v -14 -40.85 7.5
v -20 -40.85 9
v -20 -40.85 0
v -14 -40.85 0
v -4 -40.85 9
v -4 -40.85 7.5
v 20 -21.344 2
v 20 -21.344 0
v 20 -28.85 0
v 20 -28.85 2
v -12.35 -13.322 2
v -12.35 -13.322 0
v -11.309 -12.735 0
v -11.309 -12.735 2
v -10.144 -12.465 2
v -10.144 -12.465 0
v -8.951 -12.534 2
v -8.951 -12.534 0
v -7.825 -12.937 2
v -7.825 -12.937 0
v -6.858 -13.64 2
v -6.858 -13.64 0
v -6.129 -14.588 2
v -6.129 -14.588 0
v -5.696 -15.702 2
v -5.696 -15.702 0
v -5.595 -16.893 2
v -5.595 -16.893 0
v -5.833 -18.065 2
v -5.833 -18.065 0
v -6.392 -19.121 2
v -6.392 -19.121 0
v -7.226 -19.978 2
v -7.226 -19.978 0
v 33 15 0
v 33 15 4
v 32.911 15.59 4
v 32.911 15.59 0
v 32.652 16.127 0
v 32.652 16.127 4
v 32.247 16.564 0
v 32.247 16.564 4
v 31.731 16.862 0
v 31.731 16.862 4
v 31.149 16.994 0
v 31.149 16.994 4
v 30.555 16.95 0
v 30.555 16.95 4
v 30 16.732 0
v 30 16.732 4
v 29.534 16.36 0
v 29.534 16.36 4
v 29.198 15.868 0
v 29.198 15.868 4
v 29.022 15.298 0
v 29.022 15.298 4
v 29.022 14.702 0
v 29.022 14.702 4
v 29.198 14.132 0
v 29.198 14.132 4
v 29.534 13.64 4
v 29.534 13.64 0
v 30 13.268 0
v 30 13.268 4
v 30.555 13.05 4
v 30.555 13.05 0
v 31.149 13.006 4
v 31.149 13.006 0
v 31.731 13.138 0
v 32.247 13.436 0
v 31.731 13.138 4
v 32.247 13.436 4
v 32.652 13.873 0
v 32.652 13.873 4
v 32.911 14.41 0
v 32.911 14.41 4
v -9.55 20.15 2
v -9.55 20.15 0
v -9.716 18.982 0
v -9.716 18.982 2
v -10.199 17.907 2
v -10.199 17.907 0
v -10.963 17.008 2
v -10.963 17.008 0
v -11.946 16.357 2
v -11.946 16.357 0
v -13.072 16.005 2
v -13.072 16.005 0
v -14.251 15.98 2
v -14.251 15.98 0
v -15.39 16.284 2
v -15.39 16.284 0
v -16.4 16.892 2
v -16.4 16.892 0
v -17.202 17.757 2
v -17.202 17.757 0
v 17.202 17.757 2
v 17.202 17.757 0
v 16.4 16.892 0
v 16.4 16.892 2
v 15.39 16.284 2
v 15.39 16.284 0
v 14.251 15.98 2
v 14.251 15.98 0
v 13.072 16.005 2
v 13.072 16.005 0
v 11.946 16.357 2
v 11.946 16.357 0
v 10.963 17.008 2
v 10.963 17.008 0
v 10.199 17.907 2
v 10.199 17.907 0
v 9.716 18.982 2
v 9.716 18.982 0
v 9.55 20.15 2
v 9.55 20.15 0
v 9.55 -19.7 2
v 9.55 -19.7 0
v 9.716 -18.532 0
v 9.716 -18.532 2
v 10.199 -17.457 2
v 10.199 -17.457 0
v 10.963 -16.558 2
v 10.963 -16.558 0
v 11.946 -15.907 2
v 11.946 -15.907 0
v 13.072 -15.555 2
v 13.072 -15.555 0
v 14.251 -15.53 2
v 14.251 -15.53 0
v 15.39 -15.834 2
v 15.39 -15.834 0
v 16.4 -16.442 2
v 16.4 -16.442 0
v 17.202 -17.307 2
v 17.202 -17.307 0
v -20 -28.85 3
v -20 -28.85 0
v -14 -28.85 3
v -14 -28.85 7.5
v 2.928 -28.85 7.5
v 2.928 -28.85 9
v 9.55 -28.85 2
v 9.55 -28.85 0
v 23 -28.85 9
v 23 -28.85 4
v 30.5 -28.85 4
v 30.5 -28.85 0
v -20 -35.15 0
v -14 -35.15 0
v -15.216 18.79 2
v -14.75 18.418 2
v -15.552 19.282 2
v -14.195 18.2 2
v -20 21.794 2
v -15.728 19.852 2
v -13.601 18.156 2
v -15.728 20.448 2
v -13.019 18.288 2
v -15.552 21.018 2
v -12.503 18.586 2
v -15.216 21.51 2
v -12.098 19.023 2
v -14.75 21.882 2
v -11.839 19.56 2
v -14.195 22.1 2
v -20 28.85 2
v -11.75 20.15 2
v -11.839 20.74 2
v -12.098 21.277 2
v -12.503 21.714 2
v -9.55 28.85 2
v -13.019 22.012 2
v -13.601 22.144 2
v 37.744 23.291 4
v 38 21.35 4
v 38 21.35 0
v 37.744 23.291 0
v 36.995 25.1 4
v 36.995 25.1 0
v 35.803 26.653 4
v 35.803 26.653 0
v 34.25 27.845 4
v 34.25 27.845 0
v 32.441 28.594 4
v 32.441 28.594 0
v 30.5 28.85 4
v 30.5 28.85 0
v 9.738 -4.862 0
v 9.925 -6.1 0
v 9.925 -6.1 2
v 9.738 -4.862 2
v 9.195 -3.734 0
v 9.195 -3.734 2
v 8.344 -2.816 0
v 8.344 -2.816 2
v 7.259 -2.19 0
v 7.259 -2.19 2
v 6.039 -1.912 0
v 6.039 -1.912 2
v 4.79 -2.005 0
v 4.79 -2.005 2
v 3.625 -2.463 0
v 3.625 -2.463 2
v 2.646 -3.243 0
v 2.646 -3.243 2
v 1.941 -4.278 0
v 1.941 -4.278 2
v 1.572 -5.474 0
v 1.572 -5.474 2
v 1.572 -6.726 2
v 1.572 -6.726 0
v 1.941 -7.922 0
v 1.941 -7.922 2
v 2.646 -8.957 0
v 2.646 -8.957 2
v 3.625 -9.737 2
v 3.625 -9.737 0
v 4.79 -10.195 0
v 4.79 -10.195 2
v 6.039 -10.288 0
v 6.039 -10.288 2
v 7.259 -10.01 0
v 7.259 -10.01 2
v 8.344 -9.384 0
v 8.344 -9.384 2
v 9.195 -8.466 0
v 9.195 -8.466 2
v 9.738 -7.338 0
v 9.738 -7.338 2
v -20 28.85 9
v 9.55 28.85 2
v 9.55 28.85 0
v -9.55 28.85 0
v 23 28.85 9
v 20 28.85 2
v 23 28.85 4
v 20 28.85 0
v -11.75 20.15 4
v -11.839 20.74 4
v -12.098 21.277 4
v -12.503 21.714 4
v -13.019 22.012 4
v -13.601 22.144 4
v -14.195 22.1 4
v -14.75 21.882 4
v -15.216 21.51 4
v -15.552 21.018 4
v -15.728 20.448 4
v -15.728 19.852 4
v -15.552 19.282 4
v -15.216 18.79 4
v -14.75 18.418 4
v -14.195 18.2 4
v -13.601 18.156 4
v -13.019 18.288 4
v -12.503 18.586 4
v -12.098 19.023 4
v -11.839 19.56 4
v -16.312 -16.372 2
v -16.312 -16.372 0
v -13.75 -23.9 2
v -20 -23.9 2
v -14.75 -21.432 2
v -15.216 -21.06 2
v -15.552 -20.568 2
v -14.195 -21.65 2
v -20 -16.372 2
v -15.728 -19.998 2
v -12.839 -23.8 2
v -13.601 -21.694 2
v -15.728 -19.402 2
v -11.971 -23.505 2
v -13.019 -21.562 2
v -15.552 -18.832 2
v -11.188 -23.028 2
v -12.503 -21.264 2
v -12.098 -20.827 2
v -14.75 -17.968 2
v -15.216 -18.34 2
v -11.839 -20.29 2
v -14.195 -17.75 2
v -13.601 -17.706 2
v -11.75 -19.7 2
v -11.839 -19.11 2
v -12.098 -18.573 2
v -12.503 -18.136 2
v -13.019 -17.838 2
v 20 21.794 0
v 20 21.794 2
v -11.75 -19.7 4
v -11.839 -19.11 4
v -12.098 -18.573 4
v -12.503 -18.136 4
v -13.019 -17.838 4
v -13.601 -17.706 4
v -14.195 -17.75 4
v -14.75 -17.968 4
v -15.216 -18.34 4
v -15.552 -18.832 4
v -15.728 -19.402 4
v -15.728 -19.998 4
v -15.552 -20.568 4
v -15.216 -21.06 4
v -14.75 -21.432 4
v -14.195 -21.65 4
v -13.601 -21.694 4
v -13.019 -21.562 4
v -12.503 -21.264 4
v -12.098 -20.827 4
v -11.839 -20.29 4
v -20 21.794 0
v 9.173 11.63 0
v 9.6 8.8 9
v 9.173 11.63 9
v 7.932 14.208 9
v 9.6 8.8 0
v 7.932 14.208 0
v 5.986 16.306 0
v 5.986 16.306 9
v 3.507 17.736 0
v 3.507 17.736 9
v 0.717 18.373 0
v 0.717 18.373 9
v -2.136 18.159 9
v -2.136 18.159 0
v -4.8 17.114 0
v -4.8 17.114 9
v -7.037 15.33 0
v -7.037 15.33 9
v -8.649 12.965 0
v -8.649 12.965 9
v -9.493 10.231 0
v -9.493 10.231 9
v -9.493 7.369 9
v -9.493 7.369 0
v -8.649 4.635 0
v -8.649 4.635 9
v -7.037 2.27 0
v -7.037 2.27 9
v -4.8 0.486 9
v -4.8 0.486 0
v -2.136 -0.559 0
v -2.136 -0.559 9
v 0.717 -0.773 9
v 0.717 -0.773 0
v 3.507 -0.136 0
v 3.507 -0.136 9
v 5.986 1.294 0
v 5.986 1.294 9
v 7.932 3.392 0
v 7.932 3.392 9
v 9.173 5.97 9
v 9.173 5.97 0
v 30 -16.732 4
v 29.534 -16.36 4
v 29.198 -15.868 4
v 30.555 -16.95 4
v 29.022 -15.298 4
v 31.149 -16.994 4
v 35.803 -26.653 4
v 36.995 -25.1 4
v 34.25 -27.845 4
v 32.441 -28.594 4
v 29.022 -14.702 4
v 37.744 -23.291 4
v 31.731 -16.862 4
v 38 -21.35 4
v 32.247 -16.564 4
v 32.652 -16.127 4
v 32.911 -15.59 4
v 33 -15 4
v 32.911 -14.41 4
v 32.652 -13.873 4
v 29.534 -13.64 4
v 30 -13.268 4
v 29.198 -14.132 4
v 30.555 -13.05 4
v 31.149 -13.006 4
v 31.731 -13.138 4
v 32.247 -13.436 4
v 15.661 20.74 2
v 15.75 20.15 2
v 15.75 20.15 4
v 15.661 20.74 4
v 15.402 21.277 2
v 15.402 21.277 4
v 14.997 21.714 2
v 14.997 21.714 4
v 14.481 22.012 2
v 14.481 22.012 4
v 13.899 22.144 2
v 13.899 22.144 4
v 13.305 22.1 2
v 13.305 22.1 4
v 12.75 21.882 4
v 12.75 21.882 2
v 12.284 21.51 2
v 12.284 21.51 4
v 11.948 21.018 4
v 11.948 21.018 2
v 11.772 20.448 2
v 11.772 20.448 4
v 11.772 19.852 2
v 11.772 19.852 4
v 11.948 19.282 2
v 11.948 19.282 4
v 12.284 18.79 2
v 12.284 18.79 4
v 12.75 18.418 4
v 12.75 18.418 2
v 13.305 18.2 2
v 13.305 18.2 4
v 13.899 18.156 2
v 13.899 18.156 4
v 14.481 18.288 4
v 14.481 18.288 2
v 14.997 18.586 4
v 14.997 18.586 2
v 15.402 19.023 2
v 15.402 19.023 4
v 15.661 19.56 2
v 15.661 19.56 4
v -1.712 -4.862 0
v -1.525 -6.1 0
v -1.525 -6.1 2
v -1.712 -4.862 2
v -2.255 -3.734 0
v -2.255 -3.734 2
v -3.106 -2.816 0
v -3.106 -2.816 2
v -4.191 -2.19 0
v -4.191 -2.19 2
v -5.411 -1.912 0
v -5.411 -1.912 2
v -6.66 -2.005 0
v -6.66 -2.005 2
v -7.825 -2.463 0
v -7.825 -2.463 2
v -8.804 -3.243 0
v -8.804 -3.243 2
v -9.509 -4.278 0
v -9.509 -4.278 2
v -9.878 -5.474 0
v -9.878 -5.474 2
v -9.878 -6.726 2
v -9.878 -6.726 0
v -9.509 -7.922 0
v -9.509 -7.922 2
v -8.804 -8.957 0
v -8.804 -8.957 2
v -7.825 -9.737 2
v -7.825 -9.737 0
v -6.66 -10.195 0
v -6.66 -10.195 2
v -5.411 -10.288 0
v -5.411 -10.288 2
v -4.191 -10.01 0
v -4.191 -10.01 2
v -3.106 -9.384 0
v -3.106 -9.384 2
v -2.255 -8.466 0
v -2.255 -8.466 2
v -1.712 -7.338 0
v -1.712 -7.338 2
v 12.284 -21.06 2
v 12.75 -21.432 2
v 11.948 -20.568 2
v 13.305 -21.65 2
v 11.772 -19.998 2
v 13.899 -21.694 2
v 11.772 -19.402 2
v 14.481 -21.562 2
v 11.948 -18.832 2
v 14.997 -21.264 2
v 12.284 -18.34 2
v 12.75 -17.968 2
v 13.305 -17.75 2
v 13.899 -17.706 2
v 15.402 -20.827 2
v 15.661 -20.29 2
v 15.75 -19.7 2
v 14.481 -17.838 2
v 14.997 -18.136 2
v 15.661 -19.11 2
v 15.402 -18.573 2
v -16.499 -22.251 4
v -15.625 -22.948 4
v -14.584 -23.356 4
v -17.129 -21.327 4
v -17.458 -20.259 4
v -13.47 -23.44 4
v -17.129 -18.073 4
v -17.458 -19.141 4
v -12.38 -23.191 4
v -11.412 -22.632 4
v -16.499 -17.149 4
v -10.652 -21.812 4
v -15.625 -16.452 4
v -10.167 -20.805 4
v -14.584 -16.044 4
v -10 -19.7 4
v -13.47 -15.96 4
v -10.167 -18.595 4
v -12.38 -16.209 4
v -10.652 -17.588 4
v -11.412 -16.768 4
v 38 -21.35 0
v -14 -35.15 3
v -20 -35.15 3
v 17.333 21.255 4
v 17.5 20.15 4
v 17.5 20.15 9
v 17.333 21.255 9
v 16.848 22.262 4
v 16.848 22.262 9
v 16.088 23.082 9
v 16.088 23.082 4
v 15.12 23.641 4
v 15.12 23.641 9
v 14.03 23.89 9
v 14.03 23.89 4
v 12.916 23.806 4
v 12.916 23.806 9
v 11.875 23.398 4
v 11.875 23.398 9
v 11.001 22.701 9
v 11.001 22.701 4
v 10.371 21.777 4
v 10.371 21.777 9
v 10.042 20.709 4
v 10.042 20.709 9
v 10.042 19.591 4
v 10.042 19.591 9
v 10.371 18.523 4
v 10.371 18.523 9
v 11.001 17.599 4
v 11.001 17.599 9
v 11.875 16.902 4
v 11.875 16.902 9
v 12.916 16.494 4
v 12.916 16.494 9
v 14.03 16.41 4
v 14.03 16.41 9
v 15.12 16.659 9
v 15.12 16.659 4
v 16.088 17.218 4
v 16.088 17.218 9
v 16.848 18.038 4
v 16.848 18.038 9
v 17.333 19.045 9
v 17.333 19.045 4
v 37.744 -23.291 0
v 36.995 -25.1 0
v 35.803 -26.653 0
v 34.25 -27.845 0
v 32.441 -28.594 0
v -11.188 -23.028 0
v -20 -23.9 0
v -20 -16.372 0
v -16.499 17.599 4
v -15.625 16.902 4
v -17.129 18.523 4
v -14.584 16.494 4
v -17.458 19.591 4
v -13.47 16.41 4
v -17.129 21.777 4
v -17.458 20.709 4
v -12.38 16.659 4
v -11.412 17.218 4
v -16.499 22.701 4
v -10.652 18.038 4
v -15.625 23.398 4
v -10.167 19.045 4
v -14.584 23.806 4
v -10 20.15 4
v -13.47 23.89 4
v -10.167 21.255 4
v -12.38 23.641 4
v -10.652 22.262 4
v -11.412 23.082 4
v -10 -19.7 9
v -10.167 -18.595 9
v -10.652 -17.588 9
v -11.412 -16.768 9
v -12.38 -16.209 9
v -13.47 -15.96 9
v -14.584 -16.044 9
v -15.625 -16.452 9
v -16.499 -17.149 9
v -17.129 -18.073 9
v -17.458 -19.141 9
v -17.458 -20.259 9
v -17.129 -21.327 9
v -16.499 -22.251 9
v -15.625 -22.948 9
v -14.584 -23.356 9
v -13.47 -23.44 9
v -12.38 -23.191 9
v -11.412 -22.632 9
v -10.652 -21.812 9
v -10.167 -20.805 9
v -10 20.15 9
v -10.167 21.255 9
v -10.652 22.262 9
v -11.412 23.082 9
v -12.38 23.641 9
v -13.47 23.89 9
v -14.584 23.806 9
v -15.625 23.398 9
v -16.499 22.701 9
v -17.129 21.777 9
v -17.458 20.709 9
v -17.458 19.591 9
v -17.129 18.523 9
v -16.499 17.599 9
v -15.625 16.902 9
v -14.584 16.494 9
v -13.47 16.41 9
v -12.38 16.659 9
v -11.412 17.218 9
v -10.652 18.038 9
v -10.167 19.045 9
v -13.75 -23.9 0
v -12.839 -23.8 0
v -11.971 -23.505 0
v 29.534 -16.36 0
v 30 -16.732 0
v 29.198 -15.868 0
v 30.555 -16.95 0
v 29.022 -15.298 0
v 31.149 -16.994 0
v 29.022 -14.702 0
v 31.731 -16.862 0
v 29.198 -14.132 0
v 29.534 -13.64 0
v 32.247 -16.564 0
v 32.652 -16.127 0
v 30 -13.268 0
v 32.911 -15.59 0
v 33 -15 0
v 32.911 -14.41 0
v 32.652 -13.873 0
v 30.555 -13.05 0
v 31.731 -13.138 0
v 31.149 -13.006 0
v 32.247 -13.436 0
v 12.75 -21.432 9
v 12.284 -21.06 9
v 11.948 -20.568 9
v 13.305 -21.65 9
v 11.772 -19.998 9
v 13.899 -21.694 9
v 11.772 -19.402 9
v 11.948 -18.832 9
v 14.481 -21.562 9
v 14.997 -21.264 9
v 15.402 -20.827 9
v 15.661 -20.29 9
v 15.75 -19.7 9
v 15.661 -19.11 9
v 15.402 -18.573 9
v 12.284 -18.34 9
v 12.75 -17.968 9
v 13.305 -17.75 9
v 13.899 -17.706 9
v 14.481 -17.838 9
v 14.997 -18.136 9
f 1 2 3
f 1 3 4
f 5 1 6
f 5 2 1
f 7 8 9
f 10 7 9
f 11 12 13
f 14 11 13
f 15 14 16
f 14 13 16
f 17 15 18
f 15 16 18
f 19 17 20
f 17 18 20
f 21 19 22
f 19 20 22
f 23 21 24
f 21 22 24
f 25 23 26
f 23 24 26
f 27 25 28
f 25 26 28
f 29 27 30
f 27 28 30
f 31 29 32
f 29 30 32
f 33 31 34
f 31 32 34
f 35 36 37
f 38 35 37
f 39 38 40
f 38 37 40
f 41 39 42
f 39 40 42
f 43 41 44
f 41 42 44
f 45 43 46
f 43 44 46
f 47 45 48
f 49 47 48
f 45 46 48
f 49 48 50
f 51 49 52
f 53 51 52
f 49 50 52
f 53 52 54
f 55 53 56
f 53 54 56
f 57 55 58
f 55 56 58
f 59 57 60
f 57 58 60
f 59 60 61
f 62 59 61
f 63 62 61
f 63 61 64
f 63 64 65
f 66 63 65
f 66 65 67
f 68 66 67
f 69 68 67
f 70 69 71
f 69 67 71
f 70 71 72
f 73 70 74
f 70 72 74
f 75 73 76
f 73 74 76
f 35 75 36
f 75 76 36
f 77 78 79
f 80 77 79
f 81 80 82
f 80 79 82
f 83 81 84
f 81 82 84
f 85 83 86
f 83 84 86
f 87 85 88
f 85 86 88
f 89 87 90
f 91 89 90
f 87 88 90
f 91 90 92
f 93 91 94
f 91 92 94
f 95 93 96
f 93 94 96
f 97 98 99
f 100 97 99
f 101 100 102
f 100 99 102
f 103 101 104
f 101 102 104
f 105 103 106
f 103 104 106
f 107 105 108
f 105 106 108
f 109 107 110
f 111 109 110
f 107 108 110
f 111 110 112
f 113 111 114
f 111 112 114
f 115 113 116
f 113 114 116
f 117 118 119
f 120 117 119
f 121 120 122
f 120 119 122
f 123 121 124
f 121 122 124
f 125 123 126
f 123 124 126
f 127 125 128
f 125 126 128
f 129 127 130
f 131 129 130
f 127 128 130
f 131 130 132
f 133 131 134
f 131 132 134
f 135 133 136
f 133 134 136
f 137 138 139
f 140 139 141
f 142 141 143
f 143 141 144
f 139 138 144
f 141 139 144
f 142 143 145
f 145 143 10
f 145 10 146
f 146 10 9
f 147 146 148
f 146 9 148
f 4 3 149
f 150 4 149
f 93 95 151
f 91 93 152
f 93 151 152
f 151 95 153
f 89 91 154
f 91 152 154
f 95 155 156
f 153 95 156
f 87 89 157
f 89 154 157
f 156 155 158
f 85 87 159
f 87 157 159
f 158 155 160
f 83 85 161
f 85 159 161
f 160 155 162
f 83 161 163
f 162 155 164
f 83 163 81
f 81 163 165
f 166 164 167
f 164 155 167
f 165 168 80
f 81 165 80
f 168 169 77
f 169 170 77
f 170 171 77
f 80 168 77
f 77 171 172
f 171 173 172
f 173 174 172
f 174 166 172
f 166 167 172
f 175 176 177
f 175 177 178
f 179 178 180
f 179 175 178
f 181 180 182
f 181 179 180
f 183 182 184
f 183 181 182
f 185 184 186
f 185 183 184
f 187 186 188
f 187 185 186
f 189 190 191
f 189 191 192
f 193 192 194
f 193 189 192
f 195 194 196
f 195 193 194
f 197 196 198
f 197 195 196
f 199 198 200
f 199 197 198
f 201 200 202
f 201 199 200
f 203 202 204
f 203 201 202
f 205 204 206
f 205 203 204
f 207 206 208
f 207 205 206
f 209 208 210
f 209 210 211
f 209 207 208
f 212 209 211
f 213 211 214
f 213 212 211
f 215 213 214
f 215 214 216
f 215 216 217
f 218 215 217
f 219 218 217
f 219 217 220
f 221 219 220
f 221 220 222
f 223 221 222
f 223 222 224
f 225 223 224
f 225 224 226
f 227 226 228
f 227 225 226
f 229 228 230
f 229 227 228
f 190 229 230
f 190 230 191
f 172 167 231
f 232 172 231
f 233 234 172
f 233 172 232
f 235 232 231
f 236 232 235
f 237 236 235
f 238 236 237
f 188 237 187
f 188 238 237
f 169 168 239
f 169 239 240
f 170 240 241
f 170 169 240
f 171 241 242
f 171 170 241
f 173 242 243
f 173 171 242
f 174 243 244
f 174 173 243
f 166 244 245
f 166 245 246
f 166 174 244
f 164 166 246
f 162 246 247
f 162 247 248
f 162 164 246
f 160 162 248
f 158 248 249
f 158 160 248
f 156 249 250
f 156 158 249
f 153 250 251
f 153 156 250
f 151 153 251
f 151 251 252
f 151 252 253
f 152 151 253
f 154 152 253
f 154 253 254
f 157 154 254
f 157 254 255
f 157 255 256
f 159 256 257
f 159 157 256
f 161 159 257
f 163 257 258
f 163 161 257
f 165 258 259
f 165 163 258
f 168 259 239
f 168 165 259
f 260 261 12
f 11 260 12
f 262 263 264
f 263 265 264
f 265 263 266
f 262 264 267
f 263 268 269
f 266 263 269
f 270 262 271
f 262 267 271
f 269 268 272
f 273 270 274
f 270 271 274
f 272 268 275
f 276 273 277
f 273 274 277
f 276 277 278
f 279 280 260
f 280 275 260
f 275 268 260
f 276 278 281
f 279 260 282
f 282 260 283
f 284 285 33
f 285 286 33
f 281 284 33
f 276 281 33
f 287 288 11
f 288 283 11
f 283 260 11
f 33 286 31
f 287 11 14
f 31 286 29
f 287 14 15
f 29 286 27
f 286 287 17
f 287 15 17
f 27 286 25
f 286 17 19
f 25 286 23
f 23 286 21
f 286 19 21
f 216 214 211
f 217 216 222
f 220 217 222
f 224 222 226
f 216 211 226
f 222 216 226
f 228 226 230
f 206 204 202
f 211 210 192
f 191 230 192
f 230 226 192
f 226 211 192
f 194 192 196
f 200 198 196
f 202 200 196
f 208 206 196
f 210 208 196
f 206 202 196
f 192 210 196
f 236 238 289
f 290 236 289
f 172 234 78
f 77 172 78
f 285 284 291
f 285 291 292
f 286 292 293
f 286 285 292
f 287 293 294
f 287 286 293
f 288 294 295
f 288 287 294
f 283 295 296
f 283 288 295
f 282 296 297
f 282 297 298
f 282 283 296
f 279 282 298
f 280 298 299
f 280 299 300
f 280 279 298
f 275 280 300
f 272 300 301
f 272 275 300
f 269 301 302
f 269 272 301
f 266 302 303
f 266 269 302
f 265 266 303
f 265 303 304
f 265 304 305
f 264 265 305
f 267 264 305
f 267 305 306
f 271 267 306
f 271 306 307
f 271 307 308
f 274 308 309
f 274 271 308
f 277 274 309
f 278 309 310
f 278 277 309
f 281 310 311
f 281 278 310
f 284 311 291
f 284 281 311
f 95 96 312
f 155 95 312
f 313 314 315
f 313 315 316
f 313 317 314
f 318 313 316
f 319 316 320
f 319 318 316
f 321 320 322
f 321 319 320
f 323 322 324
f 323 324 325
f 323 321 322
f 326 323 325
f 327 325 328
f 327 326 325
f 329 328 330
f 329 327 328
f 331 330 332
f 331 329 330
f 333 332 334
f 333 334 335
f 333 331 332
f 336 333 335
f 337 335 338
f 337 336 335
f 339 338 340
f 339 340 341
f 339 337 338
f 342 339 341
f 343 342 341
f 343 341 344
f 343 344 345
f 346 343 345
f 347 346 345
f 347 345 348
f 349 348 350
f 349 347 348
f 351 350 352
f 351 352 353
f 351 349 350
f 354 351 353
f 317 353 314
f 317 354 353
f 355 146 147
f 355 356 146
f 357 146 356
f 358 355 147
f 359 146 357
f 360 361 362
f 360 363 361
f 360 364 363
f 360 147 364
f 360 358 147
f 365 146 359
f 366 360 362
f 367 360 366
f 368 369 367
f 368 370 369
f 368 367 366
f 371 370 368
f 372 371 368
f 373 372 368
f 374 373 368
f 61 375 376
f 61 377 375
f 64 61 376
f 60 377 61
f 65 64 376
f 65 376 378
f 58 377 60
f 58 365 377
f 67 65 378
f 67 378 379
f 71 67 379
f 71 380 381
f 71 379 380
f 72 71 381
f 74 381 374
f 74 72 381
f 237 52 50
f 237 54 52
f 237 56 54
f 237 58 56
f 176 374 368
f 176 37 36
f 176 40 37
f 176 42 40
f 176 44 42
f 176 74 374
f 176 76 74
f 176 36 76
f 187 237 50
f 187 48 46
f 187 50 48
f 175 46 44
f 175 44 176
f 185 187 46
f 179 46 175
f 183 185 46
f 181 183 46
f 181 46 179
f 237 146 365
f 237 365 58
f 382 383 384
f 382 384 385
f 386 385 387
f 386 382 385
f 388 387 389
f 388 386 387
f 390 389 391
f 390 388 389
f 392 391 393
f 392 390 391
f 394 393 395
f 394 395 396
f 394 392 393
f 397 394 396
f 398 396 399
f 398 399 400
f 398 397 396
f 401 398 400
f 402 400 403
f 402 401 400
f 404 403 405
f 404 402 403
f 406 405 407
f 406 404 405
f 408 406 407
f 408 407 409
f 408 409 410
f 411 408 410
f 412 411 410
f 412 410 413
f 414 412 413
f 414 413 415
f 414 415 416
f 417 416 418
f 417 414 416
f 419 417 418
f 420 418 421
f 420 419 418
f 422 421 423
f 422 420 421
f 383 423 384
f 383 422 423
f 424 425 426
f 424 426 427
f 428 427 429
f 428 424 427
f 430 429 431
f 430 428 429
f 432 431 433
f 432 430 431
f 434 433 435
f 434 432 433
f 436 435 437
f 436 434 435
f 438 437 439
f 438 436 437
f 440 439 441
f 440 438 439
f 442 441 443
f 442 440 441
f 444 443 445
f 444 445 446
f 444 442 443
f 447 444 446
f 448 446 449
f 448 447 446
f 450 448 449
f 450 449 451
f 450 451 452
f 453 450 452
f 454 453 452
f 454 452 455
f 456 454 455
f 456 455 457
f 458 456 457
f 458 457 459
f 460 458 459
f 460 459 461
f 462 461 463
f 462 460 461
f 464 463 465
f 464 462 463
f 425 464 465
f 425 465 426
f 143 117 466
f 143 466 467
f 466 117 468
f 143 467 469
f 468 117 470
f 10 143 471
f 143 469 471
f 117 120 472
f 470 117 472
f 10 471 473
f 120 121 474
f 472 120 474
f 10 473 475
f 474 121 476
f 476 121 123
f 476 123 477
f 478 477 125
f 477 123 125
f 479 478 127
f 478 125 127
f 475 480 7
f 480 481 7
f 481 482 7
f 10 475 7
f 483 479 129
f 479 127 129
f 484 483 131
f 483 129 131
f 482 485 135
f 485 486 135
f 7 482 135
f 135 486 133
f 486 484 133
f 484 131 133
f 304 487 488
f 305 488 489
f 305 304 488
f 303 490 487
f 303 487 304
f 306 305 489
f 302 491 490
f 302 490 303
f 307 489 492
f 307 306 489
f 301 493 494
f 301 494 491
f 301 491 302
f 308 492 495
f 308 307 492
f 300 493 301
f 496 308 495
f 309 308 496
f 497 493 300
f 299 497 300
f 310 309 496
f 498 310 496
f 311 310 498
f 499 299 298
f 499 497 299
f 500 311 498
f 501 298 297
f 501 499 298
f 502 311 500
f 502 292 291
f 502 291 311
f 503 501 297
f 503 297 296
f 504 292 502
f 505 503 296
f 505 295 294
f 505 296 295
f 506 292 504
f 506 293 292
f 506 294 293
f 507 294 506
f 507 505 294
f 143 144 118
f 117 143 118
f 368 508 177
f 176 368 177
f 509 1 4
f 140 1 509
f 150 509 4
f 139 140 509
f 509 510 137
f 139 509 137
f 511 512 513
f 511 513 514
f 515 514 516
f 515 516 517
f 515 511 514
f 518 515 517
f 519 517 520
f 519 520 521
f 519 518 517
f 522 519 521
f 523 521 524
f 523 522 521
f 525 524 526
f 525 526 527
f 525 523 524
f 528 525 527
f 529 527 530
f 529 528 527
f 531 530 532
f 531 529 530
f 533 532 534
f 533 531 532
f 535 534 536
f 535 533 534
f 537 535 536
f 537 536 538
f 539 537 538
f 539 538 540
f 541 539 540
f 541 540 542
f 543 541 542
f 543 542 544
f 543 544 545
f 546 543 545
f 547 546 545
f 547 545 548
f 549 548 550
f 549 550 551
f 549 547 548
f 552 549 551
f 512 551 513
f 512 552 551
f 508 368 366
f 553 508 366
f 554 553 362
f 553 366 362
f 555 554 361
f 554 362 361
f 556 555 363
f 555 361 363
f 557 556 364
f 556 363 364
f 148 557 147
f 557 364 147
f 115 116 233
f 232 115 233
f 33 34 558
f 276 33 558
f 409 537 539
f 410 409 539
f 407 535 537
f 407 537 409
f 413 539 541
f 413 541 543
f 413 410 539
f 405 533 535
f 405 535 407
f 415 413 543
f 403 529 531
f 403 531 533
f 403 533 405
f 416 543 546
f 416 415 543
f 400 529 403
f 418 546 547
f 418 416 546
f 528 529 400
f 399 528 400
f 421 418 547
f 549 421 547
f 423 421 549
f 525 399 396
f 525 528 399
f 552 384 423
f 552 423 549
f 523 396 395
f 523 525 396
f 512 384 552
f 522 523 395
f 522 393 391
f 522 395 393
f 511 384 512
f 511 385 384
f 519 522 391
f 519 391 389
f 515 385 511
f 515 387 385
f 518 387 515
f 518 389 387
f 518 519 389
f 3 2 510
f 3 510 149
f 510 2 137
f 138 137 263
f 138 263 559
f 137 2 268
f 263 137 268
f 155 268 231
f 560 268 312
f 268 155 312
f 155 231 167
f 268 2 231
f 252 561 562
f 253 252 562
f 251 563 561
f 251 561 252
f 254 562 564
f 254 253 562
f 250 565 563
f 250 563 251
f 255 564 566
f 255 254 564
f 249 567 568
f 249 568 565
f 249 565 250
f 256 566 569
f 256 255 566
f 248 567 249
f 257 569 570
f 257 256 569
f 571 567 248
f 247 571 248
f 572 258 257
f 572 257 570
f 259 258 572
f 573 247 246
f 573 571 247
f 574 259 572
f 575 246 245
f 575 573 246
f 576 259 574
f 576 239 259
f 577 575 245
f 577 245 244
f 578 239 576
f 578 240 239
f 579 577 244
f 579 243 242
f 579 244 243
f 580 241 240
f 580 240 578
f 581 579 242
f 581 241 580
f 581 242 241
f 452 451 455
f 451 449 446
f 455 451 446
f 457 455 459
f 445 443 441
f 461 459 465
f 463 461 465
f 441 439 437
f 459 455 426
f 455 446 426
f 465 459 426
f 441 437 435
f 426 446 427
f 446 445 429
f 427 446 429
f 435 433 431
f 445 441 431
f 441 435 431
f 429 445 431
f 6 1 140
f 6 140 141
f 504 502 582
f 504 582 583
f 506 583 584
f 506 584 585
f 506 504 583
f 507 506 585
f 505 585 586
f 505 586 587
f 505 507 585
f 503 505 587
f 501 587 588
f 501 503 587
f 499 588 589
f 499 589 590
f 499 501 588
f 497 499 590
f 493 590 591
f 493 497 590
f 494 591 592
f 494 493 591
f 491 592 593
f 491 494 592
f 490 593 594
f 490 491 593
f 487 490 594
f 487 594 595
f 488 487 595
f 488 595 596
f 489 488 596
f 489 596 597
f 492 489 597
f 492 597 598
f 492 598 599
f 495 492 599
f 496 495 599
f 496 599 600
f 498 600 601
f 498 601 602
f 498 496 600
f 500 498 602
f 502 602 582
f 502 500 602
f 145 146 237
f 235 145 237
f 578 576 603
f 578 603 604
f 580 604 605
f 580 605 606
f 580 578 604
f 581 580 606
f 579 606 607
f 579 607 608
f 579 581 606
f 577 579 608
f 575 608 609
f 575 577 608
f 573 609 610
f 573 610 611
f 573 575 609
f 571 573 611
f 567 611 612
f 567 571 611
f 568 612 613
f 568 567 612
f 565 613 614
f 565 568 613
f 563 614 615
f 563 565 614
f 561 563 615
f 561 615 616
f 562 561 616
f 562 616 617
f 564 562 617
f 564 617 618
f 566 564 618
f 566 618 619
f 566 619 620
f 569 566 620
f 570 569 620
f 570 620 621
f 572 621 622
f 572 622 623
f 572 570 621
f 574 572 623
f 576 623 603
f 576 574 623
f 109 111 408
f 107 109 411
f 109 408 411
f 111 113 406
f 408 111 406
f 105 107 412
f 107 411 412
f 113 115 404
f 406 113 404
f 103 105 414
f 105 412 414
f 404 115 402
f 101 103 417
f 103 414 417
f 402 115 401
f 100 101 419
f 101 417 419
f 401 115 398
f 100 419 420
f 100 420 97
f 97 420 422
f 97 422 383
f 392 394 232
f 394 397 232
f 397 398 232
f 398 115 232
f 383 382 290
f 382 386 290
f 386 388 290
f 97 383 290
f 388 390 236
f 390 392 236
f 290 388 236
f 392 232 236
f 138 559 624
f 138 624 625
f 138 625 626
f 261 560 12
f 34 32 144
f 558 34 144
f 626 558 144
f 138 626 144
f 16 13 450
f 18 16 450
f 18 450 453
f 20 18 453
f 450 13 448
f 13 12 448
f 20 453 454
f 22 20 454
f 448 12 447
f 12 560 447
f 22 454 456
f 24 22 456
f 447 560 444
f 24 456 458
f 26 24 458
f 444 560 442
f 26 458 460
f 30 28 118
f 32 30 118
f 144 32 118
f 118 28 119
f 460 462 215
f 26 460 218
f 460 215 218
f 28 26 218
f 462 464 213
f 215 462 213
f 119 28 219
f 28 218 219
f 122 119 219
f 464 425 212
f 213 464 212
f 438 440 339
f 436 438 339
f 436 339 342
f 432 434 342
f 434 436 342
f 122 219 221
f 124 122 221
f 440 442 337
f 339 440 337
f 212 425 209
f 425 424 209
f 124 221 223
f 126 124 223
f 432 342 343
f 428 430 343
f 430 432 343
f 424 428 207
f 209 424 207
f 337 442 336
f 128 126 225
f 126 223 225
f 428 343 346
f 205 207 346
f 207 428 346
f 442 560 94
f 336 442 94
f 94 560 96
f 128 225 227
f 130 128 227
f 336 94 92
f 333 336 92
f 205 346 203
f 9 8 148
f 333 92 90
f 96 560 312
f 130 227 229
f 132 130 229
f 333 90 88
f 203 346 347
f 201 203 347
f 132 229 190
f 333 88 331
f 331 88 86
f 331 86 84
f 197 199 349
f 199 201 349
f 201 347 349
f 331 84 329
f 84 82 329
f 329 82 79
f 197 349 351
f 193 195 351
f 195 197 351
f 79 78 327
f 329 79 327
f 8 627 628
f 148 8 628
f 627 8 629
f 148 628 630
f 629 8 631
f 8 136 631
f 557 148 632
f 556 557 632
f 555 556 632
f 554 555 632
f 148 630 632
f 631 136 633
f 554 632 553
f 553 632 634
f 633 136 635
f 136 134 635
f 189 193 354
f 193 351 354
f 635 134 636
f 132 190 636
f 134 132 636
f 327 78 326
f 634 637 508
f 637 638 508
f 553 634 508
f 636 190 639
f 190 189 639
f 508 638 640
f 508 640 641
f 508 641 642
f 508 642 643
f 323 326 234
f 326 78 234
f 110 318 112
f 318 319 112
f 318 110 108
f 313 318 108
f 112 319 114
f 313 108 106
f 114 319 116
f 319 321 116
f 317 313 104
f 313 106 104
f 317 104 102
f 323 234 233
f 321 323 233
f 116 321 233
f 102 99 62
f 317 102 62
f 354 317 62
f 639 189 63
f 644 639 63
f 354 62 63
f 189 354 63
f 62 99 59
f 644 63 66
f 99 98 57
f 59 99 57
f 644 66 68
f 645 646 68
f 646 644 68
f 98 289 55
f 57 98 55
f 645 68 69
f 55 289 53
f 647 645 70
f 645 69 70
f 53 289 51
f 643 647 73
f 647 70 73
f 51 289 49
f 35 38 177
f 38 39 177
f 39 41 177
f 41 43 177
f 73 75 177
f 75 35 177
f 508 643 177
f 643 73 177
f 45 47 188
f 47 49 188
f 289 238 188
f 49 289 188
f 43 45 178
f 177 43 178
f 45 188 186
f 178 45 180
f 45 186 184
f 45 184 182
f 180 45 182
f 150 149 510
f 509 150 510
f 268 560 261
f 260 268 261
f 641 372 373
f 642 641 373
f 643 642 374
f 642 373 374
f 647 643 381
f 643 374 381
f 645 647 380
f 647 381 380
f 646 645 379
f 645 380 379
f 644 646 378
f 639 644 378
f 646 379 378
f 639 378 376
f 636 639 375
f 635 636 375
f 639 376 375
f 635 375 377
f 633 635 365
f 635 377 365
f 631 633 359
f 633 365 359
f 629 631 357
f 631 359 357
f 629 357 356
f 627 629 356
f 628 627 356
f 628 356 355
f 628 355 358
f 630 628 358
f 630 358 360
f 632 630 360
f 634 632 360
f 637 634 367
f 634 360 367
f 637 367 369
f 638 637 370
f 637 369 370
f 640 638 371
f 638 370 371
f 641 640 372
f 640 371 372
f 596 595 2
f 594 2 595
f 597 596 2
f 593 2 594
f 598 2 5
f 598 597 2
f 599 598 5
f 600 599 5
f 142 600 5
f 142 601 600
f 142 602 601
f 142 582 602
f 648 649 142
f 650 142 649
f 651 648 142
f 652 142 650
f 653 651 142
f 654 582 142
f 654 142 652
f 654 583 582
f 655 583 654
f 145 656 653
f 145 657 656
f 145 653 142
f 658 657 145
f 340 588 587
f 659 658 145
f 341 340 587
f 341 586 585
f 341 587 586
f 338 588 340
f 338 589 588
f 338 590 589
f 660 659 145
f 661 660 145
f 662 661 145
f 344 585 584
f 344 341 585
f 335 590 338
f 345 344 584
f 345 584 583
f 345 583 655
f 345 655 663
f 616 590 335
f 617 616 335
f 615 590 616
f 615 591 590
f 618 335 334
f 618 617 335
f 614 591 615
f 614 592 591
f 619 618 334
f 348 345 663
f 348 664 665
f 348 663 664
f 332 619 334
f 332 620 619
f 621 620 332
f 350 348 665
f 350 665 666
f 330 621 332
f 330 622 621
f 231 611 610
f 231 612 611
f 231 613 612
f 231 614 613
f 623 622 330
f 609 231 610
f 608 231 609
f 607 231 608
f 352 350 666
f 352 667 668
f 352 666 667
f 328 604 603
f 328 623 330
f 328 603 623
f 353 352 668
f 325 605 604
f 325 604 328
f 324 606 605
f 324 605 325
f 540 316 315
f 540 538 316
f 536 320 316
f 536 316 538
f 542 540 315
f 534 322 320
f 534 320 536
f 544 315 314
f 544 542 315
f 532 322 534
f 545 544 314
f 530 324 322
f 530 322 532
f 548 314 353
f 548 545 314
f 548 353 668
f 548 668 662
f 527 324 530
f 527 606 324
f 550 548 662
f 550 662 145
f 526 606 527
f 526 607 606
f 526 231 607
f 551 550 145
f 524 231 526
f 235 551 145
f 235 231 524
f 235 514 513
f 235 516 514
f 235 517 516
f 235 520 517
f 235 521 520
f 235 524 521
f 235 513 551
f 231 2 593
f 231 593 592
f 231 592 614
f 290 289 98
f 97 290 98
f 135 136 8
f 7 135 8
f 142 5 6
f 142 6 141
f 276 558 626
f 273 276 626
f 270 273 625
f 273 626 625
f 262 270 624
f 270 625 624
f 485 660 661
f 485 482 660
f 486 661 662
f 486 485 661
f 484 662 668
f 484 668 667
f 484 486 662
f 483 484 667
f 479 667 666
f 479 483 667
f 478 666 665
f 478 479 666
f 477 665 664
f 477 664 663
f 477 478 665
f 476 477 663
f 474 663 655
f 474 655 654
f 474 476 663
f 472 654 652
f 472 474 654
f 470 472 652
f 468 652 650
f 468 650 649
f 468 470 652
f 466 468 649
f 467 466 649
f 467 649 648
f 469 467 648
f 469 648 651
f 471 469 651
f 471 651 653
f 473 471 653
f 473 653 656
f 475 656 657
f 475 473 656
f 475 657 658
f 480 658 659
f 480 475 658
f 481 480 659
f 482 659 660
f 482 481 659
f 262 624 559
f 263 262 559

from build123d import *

# Parameters (mm, degrees)
SKETCH1_R           = 9.6
SKETCH1_R_2         = 4.2
BOSS_EXTRUDE1_DEPTH = 2
SKETCH4_W           = 58
SKETCH4_H           = 57.7
SKETCH4_R           = 2
SKETCH4_R_2         = 9.6
BOSS_EXTRUDE3_DEPTH = 2
SKETCH5_R           = 2
CUT_EXTRUDE1_DEPTH  = 4
SKETCH6_W           = 43
SKETCH6_H           = 57.7
SKETCH6_R           = 3.75
SKETCH6_R_2         = 9.6
SKETCH6_R_3         = 2
BOSS_EXTRUDE4_DEPTH = 5
CUT_EXTRUDE2_DEPTH  = 48.972101267
BOSS_EXTRUDE5_DEPTH = 6
BOSS_EXTRUDE6_DEPTH = 1.5


with BuildPart() as part:
    # Sketch1 → Boss-Extrude1 (new body)
    with BuildSketch(Plane.XY):
        with BuildLine():
            Line((38, 28.85), (20, 28.85))
            Line((20, 28.85), (20, 21.79369023))
            Line((20, 21.79369023), (17.201699017, 17.757141063))
            ThreePointArc((17.201699017, 17.757141063), (12.496432266, 16.141438171), (9.55, 20.15))
            Line((9.55, 20.15), (9.55, 28.85))
            Line((9.55, 28.85), (-9.55, 28.85))
            Line((-9.55, 28.85), (-9.55, 20.15))
            ThreePointArc((-9.55, 20.15), (-12.496432266, 16.141438171), (-17.201699017, 17.757141063))
            Line((-17.201699017, 17.757141063), (-20, 21.79369023))
            Line((-20, 21.79369023), (-20, -16.371914064))
            Line((-20, -16.371914064), (-16.312, -16.371914064))
            Line((-16.312, -16.371914064), (-12.349992933, -13.321914064))
            ThreePointArc((-12.349992933, -13.321914064), (-6.459906996, -14.088), (-7.225992933, -19.978085936))
            Line((-7.225992933, -19.978085936), (-11.188, -23.028085936))
            ThreePointArc((-11.188, -23.028085936), (-12.396848296, -23.676050863), (-13.75, -23.9))
            Line((-13.75, -23.9), (-20, -23.9))
            Line((-20, -23.9), (-20, -28.85))
            Line((-20, -28.85), (9.55, -28.85))
            Line((9.55, -28.85), (9.55, -19.7))
            ThreePointArc((9.55, -19.7), (12.496432266, -15.691438171), (17.201699017, -17.307141063))
            Line((17.201699017, -17.307141063), (20, -21.34369023))
            Line((20, -21.34369023), (20, -28.85))
            Line((20, -28.85), (38, -28.85))
            Line((38, -28.85), (38, 28.85))
        make_face()
        with Locations((0, 8.8)):
            Circle(SKETCH1_R, mode=Mode.SUBTRACT)
        with Locations((-5.725, -6.1)):
            Circle(SKETCH1_R_2, mode=Mode.SUBTRACT)
        with Locations((5.725, -6.1)):
            Circle(SKETCH1_R_2, mode=Mode.SUBTRACT)
    extrude(amount=BOSS_EXTRUDE1_DEPTH)

    # Sketch4 → Boss-Extrude3 (add)
    with BuildSketch(Plane.XY.offset(2)):
        with Locations((9, 0)):
            Rectangle(SKETCH4_W, SKETCH4_H)
        with Locations((13.75, -19.7)):
            Circle(SKETCH4_R, mode=Mode.SUBTRACT)
        with Locations((-13.75, 20.15)):
            Circle(SKETCH4_R, mode=Mode.SUBTRACT)
        with Locations((13.75, 20.15)):
            Circle(SKETCH4_R, mode=Mode.SUBTRACT)
        with Locations((-13.75, -19.7)):
            Circle(SKETCH4_R, mode=Mode.SUBTRACT)
        with Locations((0, 8.8)):
            Circle(SKETCH4_R_2, mode=Mode.SUBTRACT)
    extrude(amount=BOSS_EXTRUDE3_DEPTH)

    # Sketch5 → Cut-Extrude1 (cut)
    with BuildSketch(Plane.XY.offset(4)):
        with Locations((31, 15)):
            Circle(SKETCH5_R)
        with Locations((31, -15)):
            Circle(SKETCH5_R)
    extrude(amount=-CUT_EXTRUDE1_DEPTH, mode=Mode.SUBTRACT)

    # Sketch6 → Boss-Extrude4 (add)
    with BuildSketch(Plane.XY.offset(4)):
        with Locations((1.5, 0)):
            Rectangle(SKETCH6_W, SKETCH6_H)
        with Locations((-13.75, -19.7)):
            Circle(SKETCH6_R, mode=Mode.SUBTRACT)
        with Locations((0, 8.8)):
            Circle(SKETCH6_R_2, mode=Mode.SUBTRACT)
        with Locations((-13.75, 20.15)):
            Circle(SKETCH6_R, mode=Mode.SUBTRACT)
        with Locations((13.75, 20.15)):
            Circle(SKETCH6_R, mode=Mode.SUBTRACT)
        with Locations((13.75, -19.7)):
            Circle(SKETCH6_R_3, mode=Mode.SUBTRACT)
    extrude(amount=BOSS_EXTRUDE4_DEPTH)

    # Sketch7 → Cut-Extrude2 (cut, through all)
    with BuildSketch(Plane.XY.offset(4)):
        with BuildLine():
            Line((30.5, 28.85), (38, 28.85))
            Line((38, 28.85), (38, 21.35))
            ThreePointArc((38, 21.35), (35.803300859, 26.653300859), (30.5, 28.85))
        make_face()
        with BuildLine():
            Line((38, -28.85), (38, -21.35))
            ThreePointArc((38, -21.35), (35.803300859, -26.653300859), (30.5, -28.85))
            Line((30.5, -28.85), (38, -28.85))
        make_face()
    extrude(amount=-CUT_EXTRUDE2_DEPTH, mode=Mode.SUBTRACT)

    # Sketch9 → Boss-Extrude5 (add)
    with BuildSketch(Plane.ZY.offset(20)):
        Polygon((9, -28.85), (9, -40.85), (0, -40.85), (0, -35.15), (3, -35.15), (3, -28.85), align=None)
    extrude(amount=-BOSS_EXTRUDE5_DEPTH)

    # Sketch10 → Boss-Extrude6 (add)
    with BuildSketch(Plane.XY.offset(9)):
        Polygon((-14, -40.85), (-4, -40.85), (2.92820323, -28.85), (-14, -28.85), align=None)
    extrude(amount=-BOSS_EXTRUDE6_DEPTH)


solid = part.part
